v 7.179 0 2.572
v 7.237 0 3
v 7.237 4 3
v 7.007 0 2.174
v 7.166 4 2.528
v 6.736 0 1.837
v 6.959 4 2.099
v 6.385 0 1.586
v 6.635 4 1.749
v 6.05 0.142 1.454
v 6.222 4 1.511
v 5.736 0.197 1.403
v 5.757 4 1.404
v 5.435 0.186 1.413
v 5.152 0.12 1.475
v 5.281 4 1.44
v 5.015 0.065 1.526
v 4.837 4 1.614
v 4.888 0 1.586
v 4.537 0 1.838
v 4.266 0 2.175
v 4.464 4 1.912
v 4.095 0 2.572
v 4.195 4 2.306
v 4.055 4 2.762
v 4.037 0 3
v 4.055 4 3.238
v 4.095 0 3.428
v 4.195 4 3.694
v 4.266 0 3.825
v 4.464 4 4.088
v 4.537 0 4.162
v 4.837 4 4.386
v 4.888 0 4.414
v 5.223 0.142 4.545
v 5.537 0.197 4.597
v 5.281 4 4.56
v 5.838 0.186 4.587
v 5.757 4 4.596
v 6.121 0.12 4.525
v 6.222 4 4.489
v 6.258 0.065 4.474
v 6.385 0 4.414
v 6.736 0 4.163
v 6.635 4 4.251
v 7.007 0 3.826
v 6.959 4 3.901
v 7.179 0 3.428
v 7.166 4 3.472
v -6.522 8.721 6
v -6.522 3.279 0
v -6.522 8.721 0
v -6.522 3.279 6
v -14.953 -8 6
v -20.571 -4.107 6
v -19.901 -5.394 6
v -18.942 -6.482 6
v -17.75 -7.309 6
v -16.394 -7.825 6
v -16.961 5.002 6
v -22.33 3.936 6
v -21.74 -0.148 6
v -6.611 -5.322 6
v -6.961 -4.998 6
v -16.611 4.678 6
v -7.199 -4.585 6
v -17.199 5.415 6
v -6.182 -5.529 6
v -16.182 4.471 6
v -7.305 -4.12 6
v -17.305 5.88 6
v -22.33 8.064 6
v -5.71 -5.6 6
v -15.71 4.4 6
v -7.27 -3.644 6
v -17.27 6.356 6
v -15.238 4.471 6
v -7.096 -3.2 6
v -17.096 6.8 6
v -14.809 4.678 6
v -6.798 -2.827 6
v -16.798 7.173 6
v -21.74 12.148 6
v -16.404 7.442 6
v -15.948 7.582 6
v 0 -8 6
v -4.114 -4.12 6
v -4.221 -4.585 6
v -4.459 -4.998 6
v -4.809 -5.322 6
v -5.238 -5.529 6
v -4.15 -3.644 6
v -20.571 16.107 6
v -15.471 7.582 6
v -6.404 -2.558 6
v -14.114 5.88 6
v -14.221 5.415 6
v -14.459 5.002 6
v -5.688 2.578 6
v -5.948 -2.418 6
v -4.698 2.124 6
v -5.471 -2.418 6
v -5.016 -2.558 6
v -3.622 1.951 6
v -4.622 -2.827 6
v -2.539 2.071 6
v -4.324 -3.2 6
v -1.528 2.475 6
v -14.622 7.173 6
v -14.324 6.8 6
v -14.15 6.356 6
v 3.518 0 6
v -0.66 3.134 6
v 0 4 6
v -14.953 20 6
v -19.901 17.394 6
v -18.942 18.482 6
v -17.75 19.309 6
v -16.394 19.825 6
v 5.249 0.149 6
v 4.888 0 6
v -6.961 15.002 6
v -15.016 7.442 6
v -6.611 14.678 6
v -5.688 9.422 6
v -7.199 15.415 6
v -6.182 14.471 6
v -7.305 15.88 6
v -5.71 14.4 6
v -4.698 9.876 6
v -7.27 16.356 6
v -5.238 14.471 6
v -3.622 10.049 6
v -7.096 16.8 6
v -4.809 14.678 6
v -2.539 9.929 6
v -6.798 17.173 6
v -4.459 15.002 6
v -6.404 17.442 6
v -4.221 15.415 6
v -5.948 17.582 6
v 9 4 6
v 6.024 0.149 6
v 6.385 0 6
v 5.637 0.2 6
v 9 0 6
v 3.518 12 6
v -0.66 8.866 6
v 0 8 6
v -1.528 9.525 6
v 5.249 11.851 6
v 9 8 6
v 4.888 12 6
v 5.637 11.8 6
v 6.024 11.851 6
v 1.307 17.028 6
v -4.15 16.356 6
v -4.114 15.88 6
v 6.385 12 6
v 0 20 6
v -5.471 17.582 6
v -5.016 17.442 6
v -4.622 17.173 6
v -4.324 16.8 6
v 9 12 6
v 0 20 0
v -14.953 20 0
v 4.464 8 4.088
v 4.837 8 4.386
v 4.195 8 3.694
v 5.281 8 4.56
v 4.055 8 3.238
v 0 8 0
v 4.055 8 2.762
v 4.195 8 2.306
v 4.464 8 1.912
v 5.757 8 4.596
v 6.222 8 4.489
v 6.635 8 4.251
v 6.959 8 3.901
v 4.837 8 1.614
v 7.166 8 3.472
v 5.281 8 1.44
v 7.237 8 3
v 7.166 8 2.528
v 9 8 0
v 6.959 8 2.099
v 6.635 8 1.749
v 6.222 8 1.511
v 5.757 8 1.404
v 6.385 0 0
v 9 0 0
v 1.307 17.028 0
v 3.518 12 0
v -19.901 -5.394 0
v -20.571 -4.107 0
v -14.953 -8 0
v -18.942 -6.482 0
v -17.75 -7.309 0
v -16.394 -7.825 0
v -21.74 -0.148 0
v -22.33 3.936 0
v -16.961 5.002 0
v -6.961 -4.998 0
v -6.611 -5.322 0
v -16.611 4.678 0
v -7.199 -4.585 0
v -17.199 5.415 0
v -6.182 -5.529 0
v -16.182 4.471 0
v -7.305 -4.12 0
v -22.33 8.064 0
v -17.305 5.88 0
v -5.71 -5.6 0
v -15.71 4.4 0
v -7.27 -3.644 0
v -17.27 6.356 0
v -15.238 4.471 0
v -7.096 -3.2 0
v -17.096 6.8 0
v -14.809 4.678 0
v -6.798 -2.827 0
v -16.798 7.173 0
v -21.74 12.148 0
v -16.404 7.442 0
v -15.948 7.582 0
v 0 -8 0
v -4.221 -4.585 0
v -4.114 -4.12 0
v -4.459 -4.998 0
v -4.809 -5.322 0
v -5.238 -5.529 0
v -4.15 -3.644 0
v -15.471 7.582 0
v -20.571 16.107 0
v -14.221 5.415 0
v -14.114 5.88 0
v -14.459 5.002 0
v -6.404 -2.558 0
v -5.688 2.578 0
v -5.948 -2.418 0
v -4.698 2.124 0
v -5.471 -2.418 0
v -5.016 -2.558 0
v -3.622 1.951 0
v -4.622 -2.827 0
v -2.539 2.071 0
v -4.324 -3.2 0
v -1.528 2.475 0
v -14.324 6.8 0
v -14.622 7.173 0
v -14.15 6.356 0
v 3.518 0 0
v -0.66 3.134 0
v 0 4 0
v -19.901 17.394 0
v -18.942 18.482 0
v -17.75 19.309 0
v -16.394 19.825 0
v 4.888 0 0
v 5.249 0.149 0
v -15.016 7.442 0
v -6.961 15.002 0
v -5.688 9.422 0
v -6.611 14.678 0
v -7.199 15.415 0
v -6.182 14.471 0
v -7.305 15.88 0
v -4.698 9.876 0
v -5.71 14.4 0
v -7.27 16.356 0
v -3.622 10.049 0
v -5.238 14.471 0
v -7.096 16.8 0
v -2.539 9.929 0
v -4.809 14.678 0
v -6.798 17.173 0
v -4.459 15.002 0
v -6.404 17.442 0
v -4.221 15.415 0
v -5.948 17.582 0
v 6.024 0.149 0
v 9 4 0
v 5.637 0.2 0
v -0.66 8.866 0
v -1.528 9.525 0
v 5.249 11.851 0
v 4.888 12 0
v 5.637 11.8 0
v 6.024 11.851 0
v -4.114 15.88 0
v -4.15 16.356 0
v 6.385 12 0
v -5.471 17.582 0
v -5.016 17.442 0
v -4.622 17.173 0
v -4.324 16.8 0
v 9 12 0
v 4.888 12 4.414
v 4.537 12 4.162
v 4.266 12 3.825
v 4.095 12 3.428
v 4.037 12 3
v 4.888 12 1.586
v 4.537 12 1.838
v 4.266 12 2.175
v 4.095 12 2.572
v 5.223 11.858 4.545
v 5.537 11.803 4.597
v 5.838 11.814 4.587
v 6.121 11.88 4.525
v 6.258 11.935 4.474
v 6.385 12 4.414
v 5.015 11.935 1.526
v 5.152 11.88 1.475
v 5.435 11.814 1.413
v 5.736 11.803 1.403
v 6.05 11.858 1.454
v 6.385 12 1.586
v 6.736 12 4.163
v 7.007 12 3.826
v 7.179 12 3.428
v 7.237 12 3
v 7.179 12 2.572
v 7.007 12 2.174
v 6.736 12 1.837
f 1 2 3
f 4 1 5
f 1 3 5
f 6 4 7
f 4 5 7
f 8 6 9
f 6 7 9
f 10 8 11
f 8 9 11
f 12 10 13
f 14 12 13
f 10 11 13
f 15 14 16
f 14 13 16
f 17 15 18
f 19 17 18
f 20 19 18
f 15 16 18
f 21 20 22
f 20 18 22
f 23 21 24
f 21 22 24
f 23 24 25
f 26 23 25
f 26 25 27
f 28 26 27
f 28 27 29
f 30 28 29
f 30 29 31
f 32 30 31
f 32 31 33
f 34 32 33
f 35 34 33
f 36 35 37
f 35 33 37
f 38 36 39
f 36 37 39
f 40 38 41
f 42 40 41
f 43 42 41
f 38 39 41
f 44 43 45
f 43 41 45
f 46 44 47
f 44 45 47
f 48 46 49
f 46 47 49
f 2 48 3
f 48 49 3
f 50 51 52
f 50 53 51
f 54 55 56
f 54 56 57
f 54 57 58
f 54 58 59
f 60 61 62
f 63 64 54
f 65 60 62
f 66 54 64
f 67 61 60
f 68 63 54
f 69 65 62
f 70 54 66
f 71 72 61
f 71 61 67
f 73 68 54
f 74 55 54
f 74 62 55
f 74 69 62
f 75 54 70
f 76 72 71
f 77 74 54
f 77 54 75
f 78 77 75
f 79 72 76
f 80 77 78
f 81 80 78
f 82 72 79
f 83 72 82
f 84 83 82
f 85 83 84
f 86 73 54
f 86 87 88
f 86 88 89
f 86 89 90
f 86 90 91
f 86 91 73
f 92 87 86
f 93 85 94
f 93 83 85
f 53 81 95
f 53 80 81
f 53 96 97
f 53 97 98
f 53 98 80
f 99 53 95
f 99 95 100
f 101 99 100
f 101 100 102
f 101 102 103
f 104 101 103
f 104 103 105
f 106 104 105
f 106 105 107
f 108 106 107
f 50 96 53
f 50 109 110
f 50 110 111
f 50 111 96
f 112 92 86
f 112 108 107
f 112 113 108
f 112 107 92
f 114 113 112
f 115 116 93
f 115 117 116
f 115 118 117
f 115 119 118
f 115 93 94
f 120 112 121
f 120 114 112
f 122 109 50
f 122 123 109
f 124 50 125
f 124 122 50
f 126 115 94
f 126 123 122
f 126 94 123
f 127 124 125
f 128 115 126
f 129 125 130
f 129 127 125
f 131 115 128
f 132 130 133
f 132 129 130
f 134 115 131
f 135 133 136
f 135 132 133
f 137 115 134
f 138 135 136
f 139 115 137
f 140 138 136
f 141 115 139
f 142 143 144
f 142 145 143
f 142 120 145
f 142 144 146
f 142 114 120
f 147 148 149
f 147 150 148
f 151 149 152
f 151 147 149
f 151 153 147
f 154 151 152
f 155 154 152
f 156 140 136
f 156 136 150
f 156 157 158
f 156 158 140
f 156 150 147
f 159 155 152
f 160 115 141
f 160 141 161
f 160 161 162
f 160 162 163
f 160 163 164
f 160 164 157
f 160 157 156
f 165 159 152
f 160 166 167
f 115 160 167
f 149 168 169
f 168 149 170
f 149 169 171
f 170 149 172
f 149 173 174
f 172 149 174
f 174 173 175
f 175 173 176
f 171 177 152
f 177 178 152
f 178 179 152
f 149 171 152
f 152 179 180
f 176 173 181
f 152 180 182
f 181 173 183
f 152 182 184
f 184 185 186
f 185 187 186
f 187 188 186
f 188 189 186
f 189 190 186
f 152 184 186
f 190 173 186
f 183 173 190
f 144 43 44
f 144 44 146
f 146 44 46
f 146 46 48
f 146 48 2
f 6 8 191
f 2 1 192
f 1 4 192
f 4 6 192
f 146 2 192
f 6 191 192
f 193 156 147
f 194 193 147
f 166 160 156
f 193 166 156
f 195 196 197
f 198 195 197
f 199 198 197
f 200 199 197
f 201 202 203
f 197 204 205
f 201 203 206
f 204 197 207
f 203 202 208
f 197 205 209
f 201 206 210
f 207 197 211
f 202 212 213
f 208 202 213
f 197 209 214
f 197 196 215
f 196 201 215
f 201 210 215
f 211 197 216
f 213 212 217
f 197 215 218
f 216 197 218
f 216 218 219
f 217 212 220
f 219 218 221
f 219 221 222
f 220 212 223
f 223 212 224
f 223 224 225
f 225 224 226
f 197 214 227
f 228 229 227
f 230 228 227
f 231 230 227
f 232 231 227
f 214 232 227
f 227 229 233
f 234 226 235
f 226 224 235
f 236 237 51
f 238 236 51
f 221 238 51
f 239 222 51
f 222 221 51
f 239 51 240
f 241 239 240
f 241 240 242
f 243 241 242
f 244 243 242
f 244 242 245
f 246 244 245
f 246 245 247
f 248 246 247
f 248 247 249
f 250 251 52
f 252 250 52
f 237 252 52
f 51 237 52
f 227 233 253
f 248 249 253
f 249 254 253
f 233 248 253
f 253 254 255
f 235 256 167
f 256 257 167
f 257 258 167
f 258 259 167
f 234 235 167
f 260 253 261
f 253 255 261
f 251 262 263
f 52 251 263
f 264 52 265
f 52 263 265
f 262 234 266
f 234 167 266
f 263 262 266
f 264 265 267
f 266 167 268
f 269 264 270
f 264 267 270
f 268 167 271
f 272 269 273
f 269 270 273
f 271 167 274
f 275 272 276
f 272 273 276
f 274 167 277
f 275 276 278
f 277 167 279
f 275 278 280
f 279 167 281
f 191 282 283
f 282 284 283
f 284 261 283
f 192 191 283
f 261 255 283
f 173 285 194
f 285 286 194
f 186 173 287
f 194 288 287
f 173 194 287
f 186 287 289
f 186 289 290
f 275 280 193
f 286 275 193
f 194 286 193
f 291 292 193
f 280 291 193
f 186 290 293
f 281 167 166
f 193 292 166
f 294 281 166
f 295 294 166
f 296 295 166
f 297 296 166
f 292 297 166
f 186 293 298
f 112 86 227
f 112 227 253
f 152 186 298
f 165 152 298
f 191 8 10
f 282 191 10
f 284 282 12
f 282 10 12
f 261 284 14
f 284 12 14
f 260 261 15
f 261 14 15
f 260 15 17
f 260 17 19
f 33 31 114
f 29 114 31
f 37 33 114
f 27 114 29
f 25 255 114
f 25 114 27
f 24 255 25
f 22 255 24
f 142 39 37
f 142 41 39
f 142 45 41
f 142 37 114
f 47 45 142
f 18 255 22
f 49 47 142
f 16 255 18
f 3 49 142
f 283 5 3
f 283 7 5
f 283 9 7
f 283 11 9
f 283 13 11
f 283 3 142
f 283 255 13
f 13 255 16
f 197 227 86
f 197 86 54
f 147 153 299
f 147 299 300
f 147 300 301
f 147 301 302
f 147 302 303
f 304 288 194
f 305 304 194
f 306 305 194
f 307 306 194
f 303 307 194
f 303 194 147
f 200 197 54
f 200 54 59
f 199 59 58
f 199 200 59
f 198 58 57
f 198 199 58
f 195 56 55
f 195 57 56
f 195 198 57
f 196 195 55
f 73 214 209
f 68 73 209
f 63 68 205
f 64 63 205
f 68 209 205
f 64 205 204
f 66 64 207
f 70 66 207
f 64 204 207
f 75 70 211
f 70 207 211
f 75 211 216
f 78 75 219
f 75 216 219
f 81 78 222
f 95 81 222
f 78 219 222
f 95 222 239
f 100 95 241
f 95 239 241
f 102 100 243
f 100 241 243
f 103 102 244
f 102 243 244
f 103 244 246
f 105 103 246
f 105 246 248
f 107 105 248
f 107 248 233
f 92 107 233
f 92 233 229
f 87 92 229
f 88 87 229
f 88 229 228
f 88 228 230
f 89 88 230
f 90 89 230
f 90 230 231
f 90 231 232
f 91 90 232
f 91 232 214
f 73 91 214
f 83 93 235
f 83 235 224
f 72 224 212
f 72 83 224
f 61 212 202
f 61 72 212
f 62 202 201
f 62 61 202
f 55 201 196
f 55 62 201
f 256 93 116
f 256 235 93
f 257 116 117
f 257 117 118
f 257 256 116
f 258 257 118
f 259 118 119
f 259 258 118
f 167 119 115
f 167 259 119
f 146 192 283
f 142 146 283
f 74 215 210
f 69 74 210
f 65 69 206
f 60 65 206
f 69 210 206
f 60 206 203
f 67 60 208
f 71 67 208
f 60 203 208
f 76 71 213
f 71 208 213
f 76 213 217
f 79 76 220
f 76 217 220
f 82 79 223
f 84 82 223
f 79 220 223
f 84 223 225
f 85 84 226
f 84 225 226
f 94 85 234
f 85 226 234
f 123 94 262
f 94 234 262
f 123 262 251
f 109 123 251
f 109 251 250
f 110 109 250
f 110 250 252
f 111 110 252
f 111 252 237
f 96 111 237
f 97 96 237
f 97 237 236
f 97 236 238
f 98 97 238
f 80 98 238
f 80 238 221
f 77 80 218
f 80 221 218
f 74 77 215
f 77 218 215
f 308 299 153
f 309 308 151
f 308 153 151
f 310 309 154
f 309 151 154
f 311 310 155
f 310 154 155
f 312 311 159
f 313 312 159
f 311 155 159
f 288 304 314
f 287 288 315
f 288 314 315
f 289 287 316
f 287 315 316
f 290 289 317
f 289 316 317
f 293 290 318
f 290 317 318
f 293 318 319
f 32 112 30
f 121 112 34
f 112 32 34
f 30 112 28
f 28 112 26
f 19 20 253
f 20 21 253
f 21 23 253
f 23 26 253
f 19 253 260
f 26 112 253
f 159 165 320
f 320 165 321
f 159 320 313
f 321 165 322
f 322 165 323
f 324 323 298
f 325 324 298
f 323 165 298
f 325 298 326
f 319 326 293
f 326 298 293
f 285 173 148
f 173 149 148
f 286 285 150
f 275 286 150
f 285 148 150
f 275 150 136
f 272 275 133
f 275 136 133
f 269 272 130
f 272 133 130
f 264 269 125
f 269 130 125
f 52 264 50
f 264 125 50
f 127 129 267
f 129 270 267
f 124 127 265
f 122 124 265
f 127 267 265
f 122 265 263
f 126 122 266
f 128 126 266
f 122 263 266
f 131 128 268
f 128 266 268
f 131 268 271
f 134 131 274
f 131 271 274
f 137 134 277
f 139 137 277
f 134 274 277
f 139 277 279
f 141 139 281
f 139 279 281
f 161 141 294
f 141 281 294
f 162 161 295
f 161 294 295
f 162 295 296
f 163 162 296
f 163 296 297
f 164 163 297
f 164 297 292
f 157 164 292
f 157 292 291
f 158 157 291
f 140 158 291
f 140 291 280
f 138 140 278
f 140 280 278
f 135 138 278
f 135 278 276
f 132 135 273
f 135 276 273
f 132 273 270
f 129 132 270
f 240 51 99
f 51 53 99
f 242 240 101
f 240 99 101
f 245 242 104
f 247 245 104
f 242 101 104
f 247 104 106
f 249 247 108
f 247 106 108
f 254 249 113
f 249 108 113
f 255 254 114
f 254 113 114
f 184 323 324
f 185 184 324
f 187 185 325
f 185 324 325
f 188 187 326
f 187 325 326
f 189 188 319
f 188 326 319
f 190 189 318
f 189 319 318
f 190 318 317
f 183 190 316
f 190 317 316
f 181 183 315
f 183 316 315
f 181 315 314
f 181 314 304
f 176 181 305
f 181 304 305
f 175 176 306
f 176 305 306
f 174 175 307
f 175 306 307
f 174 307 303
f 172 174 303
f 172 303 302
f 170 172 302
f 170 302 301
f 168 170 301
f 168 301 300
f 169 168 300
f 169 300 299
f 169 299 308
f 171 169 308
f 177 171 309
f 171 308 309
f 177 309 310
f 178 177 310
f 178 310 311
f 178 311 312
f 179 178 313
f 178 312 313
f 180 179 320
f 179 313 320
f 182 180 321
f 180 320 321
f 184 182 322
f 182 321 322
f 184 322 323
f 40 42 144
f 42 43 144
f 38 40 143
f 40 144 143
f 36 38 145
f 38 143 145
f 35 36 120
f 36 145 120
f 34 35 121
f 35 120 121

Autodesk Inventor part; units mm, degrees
ref_plane "YZ Plane" through (0, 0, 0) normal (1, 0, 0) x (0, 1, 0)
ref_plane "XZ Plane" through (0, 0, 0) normal (0, 1, 0) x (-1, 0, 0)
ref_plane "XY Plane" through (0, 0, 0) normal (0, 0, 1) x (1, 0, 0)
sketch "スケッチ1" plane through (0, 0, 0) normal (0, 0, 1) x (1, 0, 0)
  line L0 (9, 0) -> (9, 4)
  line L1 (9, 12) -> (2.2731, 12)
  line L2 (0, 8) -> (9, 8)
  line L3 (0, 4) -> (9, 4)
  line L4 (9, 8) -> (9, 12)
  arc A0 (0, 8) -> (0, 4) centre (-5.7099, 6) ccw
  line L5 (2.2731, 12) -> (0, 14.2779)
  line L6 (2.2731, 0) -> (-5.7099, -8)
  line L7 (-5.7099, 20) -> (-15.7099, 20)
  line L8 (-5.7099, -8) -> (-15.7099, -8)
  line L9 (-15.7099, 20) -> (-25.7698, 20)
  line L10 (-25.7698, 20) -> (-25.7698, -8)
  line L11 (-25.7698, -8) -> (-15.7099, -8)
  line L12 (2.2731, 0) -> (9, 0)
  line L13 (0, 14.2779) -> (-5.7099, 20)
  point P0 (0, 0)
  point P1 (4.5, 12)
  point P2 (4.5, 0)
  point P3 (4.5, 4)
  point P4 (-25.7099, 6)
  dimension "d4" = 12.1
  dimension "d5" = 4
  dimension "d6" = 14
  dimension "d7" = 14
  dimension "d8" = 10
  dimension "d9" = 10
  dimension "d10" = 20
  dimension "d12" = 14
extrude "押し出し1" add sketch "スケッチ1" along normal blind 6
sketch "スケッチ2" plane through (0, 0, 6) normal (0, 0, 1) x (1, 0, 0)
  circle A0 centre (5.6365, 13.3) radius 1.5
  line L0 (9, 8) -> (9, 12) projected
  line L1 (11.5477, 6) -> (-28.1936, 6) construction
  line L2 (9, 12) -> (2.2731, 12) projected
  circle A1 centre (5.6365, -1.3) radius 1.5
  point P0 (0, 0)
  point P1 (4.8882, 12)
  point P2 (6.3849, 12)
  dimension "d15" = 3
  dimension "d16" = 3.3635
  dimension "d17" = 1.3
extrude "押し出し2" cut sketch "スケッチ2" against normal blind 6 contours A0 L2 | A1 picked at (5.4614, 13.0013)
sketch "スケッチ3" plane through (0, 0, 6) normal (0, 0, 1) x (1, 0, 0)
  circle A0 centre (5.6365, 13.3) radius 1.5
  line L0 (9, 12) -> (2.2731, 12) projected
  point P0 (0, 0)
  point P1 (4.8882, 12)
  point P2 (6.3849, 12)
  dimension "d20" = 3
  dimension "d21" = 1.3
extrude "押し出し3" add sketch "スケッチ3" against normal blind 6 contours A0 L0 picked at (5.4614, 13.0013)
sketch "スケッチ4" plane through (0, 0, 6) normal (0, 0, 1) x (1, 0, 0)
  arc A0 (6.3849, 12) -> (4.8882, 12) centre (5.6365, 13.3) ccw projected
  circle A1 centre (5.6365, 13.3) radius 1.5
  point P0 (0, 0)
  dimension "d24" = 3
extrude "押し出し4" cut sketch "スケッチ4" against normal blind 6
fillet "フィレット1" radius 5 1 edges at (-25.7698, 20, 3)
fillet "フィレット2" radius 5 1 edges at (-25.7698, -8, 3)
fillet "フィレット3" radius 3 4 edges at (-5.7099, -8, 3) (2.2731, 0, 3) (-5.7099, 20, 3) (2.2731, 12, 3)
sketch "スケッチ6" plane through (0, 4, 0) normal (0, 1, 0) x (1, 0, 0)
  point P0 (0, 0)
sketch "スケッチ7" plane through (4.8882, 12, 6) normal (0, 1, 0) x (1, 0, 0)
  circle A0 centre (0.7488, 3) radius 1.6
  line L0 (1.4967, 0) -> (0, 0) projected
  line L1 (4.1118, 6) -> (4.1118, 0) projected
  point P0 (-4.8882, 6)
  point P1 (0.7483, 0)
  dimension "d43" = 3.2
  dimension "d44" = 3
  dimension "d45" = 3.363
extrude "押し出し5" cut sketch "スケッチ7" against normal blind 28
sketch "スケッチ11" plane through (0, 0, 6) normal (0, 0, 1) x (1, 0, 0)
  line L0 (-6.9544, 20) -> (-20.7698, 20) projected
  line L1 (-20.7698, 20) -> (-6.9544, 20)
  arc A0 (1.394, 12.8809) -> (3.5176, 12) centre (3.5176, 15) ccw projected
  line L2 (0, 20) -> (1.3068, 17.0279)
  arc A1 (1.394, 12.8809) -> (3.5176, 12) centre (3.5176, 15) ccw
  arc A2 (-4.8308, 19.1191) -> (-6.9544, 20) centre (-6.9544, 17) ccw projected
  arc A3 (-4.8308, 19.1191) -> (-6.9544, 20) centre (-6.9544, 17) ccw
  line L3 (1.394, 12.8809) -> (-4.8308, 19.1191) projected
  line L4 (-4.8308, 19.1191) -> (1.394, 12.8809)
  arc A4 (0, 8) -> (0, 4) centre (-5.7099, 6) ccw projected
  line L5 (-11.7599, 6) -> (12.1155, 6) construction
  line L6 (-20.7698, -8) -> (0, -8)
  line L7 (0, -8) -> (3.5176, 0)
  arc A5 (-6.9544, -8) -> (-4.8308, -7.1191) centre (-6.9544, -5) ccw
  line L8 (1.394, -0.8809) -> (-4.8308, -7.1191)
  line L9 (-6.9544, 20) -> (0, 20)
  line L10 (1.3068, 17.0279) -> (3.5176, 12)
  arc A6 (3.5176, 0) -> (1.394, -0.8809) centre (3.5176, -3) ccw
  point P0 (0, 0)
extrude "押し出し6" add sketch "スケッチ11" against normal blind 6
sketch "スケッチ12" plane through (0, 0, 6) normal (0, 0, 1) x (1, 0, 0)
  arc A0 (0, 8) -> (0, 4) centre (-5.7099, 6) ccw projected
  point P0 (0, 0)
  point P1 (-15.7099, 6)
  point P2 (-5.7099, 16)
  point P3 (-5.7099, -4)
  dimension "d74" = 10
  dimension "d76" = 10
  dimension "d77" = 10
hole "穴4" at (-15.7099, 6, 6) at (-5.7099, 16, 6) at (-5.7099, -4, 6) direction (0, 0, -1) diameter 3.2 end through all
sketch "スケッチ13" plane through (0, 0, 6) normal (0, 0, 1) x (1, 0, 0)
  line L0 (-20.7698, -8) -> (0, -8) projected
  line L1 (0, 20) -> (-20.7698, 20) projected
  line L2 (-18.7698, 20) -> (-18.7698, -8) construction
  line L3 (-25.7698, 15) -> (-25.7698, -3) projected
  arc A0 (-18.7698, 20) -> (-18.7698, -8) centre (6.3784, 6) ccw
  line L4 (-18.7698, 20) -> (-29.3351, 20)
  line L5 (-29.3351, 20) -> (-29.3351, -8)
  line L6 (-29.3351, -8) -> (-18.7698, -8)
  point P0 (0, 0)
  dimension "d85" = 7
extrude "押し出し7" cut sketch "スケッチ13" against normal blind 6
fillet "フィレット4" radius 6 1 edges at (-18.7698, 20, 3)
fillet "フィレット5" radius 6 1 edges at (-18.7698, -8, 3)
sketch "スケッチ14" plane through (0, 0, 6) normal (0, 0, 1) x (1, 0, 0)
  arc A0 (0, 8) -> (0, 4) centre (-3.5217, 6) ccw
  arc A1 (0, 8) -> (0, 4) centre (-5.7099, 6) ccw projected
  point P0 (0, 0)
  point P1 (0, 4)
  dimension "d90" = 8.1
extrude "押し出し8" add sketch "スケッチ14" against normal blind 6
sketch "スケッチ15" plane through (0, 0, 6) normal (0, 0, 1) x (1, 0, 0)
  arc A0 (0, 8) -> (0, 4) centre (-3.5217, 6) ccw projected
  line L0 (-6.5217, 3.2792) -> (-6.5217, 8.7208)
  point P0 (0, 0)
  point P1 (-6.5217, 6)
  dimension "d93" = 3
extrude "押し出し9" add sketch "スケッチ15" against normal blind 6
properties part number "射出_腕固定3" material "ポリカーボネート、クリア"
